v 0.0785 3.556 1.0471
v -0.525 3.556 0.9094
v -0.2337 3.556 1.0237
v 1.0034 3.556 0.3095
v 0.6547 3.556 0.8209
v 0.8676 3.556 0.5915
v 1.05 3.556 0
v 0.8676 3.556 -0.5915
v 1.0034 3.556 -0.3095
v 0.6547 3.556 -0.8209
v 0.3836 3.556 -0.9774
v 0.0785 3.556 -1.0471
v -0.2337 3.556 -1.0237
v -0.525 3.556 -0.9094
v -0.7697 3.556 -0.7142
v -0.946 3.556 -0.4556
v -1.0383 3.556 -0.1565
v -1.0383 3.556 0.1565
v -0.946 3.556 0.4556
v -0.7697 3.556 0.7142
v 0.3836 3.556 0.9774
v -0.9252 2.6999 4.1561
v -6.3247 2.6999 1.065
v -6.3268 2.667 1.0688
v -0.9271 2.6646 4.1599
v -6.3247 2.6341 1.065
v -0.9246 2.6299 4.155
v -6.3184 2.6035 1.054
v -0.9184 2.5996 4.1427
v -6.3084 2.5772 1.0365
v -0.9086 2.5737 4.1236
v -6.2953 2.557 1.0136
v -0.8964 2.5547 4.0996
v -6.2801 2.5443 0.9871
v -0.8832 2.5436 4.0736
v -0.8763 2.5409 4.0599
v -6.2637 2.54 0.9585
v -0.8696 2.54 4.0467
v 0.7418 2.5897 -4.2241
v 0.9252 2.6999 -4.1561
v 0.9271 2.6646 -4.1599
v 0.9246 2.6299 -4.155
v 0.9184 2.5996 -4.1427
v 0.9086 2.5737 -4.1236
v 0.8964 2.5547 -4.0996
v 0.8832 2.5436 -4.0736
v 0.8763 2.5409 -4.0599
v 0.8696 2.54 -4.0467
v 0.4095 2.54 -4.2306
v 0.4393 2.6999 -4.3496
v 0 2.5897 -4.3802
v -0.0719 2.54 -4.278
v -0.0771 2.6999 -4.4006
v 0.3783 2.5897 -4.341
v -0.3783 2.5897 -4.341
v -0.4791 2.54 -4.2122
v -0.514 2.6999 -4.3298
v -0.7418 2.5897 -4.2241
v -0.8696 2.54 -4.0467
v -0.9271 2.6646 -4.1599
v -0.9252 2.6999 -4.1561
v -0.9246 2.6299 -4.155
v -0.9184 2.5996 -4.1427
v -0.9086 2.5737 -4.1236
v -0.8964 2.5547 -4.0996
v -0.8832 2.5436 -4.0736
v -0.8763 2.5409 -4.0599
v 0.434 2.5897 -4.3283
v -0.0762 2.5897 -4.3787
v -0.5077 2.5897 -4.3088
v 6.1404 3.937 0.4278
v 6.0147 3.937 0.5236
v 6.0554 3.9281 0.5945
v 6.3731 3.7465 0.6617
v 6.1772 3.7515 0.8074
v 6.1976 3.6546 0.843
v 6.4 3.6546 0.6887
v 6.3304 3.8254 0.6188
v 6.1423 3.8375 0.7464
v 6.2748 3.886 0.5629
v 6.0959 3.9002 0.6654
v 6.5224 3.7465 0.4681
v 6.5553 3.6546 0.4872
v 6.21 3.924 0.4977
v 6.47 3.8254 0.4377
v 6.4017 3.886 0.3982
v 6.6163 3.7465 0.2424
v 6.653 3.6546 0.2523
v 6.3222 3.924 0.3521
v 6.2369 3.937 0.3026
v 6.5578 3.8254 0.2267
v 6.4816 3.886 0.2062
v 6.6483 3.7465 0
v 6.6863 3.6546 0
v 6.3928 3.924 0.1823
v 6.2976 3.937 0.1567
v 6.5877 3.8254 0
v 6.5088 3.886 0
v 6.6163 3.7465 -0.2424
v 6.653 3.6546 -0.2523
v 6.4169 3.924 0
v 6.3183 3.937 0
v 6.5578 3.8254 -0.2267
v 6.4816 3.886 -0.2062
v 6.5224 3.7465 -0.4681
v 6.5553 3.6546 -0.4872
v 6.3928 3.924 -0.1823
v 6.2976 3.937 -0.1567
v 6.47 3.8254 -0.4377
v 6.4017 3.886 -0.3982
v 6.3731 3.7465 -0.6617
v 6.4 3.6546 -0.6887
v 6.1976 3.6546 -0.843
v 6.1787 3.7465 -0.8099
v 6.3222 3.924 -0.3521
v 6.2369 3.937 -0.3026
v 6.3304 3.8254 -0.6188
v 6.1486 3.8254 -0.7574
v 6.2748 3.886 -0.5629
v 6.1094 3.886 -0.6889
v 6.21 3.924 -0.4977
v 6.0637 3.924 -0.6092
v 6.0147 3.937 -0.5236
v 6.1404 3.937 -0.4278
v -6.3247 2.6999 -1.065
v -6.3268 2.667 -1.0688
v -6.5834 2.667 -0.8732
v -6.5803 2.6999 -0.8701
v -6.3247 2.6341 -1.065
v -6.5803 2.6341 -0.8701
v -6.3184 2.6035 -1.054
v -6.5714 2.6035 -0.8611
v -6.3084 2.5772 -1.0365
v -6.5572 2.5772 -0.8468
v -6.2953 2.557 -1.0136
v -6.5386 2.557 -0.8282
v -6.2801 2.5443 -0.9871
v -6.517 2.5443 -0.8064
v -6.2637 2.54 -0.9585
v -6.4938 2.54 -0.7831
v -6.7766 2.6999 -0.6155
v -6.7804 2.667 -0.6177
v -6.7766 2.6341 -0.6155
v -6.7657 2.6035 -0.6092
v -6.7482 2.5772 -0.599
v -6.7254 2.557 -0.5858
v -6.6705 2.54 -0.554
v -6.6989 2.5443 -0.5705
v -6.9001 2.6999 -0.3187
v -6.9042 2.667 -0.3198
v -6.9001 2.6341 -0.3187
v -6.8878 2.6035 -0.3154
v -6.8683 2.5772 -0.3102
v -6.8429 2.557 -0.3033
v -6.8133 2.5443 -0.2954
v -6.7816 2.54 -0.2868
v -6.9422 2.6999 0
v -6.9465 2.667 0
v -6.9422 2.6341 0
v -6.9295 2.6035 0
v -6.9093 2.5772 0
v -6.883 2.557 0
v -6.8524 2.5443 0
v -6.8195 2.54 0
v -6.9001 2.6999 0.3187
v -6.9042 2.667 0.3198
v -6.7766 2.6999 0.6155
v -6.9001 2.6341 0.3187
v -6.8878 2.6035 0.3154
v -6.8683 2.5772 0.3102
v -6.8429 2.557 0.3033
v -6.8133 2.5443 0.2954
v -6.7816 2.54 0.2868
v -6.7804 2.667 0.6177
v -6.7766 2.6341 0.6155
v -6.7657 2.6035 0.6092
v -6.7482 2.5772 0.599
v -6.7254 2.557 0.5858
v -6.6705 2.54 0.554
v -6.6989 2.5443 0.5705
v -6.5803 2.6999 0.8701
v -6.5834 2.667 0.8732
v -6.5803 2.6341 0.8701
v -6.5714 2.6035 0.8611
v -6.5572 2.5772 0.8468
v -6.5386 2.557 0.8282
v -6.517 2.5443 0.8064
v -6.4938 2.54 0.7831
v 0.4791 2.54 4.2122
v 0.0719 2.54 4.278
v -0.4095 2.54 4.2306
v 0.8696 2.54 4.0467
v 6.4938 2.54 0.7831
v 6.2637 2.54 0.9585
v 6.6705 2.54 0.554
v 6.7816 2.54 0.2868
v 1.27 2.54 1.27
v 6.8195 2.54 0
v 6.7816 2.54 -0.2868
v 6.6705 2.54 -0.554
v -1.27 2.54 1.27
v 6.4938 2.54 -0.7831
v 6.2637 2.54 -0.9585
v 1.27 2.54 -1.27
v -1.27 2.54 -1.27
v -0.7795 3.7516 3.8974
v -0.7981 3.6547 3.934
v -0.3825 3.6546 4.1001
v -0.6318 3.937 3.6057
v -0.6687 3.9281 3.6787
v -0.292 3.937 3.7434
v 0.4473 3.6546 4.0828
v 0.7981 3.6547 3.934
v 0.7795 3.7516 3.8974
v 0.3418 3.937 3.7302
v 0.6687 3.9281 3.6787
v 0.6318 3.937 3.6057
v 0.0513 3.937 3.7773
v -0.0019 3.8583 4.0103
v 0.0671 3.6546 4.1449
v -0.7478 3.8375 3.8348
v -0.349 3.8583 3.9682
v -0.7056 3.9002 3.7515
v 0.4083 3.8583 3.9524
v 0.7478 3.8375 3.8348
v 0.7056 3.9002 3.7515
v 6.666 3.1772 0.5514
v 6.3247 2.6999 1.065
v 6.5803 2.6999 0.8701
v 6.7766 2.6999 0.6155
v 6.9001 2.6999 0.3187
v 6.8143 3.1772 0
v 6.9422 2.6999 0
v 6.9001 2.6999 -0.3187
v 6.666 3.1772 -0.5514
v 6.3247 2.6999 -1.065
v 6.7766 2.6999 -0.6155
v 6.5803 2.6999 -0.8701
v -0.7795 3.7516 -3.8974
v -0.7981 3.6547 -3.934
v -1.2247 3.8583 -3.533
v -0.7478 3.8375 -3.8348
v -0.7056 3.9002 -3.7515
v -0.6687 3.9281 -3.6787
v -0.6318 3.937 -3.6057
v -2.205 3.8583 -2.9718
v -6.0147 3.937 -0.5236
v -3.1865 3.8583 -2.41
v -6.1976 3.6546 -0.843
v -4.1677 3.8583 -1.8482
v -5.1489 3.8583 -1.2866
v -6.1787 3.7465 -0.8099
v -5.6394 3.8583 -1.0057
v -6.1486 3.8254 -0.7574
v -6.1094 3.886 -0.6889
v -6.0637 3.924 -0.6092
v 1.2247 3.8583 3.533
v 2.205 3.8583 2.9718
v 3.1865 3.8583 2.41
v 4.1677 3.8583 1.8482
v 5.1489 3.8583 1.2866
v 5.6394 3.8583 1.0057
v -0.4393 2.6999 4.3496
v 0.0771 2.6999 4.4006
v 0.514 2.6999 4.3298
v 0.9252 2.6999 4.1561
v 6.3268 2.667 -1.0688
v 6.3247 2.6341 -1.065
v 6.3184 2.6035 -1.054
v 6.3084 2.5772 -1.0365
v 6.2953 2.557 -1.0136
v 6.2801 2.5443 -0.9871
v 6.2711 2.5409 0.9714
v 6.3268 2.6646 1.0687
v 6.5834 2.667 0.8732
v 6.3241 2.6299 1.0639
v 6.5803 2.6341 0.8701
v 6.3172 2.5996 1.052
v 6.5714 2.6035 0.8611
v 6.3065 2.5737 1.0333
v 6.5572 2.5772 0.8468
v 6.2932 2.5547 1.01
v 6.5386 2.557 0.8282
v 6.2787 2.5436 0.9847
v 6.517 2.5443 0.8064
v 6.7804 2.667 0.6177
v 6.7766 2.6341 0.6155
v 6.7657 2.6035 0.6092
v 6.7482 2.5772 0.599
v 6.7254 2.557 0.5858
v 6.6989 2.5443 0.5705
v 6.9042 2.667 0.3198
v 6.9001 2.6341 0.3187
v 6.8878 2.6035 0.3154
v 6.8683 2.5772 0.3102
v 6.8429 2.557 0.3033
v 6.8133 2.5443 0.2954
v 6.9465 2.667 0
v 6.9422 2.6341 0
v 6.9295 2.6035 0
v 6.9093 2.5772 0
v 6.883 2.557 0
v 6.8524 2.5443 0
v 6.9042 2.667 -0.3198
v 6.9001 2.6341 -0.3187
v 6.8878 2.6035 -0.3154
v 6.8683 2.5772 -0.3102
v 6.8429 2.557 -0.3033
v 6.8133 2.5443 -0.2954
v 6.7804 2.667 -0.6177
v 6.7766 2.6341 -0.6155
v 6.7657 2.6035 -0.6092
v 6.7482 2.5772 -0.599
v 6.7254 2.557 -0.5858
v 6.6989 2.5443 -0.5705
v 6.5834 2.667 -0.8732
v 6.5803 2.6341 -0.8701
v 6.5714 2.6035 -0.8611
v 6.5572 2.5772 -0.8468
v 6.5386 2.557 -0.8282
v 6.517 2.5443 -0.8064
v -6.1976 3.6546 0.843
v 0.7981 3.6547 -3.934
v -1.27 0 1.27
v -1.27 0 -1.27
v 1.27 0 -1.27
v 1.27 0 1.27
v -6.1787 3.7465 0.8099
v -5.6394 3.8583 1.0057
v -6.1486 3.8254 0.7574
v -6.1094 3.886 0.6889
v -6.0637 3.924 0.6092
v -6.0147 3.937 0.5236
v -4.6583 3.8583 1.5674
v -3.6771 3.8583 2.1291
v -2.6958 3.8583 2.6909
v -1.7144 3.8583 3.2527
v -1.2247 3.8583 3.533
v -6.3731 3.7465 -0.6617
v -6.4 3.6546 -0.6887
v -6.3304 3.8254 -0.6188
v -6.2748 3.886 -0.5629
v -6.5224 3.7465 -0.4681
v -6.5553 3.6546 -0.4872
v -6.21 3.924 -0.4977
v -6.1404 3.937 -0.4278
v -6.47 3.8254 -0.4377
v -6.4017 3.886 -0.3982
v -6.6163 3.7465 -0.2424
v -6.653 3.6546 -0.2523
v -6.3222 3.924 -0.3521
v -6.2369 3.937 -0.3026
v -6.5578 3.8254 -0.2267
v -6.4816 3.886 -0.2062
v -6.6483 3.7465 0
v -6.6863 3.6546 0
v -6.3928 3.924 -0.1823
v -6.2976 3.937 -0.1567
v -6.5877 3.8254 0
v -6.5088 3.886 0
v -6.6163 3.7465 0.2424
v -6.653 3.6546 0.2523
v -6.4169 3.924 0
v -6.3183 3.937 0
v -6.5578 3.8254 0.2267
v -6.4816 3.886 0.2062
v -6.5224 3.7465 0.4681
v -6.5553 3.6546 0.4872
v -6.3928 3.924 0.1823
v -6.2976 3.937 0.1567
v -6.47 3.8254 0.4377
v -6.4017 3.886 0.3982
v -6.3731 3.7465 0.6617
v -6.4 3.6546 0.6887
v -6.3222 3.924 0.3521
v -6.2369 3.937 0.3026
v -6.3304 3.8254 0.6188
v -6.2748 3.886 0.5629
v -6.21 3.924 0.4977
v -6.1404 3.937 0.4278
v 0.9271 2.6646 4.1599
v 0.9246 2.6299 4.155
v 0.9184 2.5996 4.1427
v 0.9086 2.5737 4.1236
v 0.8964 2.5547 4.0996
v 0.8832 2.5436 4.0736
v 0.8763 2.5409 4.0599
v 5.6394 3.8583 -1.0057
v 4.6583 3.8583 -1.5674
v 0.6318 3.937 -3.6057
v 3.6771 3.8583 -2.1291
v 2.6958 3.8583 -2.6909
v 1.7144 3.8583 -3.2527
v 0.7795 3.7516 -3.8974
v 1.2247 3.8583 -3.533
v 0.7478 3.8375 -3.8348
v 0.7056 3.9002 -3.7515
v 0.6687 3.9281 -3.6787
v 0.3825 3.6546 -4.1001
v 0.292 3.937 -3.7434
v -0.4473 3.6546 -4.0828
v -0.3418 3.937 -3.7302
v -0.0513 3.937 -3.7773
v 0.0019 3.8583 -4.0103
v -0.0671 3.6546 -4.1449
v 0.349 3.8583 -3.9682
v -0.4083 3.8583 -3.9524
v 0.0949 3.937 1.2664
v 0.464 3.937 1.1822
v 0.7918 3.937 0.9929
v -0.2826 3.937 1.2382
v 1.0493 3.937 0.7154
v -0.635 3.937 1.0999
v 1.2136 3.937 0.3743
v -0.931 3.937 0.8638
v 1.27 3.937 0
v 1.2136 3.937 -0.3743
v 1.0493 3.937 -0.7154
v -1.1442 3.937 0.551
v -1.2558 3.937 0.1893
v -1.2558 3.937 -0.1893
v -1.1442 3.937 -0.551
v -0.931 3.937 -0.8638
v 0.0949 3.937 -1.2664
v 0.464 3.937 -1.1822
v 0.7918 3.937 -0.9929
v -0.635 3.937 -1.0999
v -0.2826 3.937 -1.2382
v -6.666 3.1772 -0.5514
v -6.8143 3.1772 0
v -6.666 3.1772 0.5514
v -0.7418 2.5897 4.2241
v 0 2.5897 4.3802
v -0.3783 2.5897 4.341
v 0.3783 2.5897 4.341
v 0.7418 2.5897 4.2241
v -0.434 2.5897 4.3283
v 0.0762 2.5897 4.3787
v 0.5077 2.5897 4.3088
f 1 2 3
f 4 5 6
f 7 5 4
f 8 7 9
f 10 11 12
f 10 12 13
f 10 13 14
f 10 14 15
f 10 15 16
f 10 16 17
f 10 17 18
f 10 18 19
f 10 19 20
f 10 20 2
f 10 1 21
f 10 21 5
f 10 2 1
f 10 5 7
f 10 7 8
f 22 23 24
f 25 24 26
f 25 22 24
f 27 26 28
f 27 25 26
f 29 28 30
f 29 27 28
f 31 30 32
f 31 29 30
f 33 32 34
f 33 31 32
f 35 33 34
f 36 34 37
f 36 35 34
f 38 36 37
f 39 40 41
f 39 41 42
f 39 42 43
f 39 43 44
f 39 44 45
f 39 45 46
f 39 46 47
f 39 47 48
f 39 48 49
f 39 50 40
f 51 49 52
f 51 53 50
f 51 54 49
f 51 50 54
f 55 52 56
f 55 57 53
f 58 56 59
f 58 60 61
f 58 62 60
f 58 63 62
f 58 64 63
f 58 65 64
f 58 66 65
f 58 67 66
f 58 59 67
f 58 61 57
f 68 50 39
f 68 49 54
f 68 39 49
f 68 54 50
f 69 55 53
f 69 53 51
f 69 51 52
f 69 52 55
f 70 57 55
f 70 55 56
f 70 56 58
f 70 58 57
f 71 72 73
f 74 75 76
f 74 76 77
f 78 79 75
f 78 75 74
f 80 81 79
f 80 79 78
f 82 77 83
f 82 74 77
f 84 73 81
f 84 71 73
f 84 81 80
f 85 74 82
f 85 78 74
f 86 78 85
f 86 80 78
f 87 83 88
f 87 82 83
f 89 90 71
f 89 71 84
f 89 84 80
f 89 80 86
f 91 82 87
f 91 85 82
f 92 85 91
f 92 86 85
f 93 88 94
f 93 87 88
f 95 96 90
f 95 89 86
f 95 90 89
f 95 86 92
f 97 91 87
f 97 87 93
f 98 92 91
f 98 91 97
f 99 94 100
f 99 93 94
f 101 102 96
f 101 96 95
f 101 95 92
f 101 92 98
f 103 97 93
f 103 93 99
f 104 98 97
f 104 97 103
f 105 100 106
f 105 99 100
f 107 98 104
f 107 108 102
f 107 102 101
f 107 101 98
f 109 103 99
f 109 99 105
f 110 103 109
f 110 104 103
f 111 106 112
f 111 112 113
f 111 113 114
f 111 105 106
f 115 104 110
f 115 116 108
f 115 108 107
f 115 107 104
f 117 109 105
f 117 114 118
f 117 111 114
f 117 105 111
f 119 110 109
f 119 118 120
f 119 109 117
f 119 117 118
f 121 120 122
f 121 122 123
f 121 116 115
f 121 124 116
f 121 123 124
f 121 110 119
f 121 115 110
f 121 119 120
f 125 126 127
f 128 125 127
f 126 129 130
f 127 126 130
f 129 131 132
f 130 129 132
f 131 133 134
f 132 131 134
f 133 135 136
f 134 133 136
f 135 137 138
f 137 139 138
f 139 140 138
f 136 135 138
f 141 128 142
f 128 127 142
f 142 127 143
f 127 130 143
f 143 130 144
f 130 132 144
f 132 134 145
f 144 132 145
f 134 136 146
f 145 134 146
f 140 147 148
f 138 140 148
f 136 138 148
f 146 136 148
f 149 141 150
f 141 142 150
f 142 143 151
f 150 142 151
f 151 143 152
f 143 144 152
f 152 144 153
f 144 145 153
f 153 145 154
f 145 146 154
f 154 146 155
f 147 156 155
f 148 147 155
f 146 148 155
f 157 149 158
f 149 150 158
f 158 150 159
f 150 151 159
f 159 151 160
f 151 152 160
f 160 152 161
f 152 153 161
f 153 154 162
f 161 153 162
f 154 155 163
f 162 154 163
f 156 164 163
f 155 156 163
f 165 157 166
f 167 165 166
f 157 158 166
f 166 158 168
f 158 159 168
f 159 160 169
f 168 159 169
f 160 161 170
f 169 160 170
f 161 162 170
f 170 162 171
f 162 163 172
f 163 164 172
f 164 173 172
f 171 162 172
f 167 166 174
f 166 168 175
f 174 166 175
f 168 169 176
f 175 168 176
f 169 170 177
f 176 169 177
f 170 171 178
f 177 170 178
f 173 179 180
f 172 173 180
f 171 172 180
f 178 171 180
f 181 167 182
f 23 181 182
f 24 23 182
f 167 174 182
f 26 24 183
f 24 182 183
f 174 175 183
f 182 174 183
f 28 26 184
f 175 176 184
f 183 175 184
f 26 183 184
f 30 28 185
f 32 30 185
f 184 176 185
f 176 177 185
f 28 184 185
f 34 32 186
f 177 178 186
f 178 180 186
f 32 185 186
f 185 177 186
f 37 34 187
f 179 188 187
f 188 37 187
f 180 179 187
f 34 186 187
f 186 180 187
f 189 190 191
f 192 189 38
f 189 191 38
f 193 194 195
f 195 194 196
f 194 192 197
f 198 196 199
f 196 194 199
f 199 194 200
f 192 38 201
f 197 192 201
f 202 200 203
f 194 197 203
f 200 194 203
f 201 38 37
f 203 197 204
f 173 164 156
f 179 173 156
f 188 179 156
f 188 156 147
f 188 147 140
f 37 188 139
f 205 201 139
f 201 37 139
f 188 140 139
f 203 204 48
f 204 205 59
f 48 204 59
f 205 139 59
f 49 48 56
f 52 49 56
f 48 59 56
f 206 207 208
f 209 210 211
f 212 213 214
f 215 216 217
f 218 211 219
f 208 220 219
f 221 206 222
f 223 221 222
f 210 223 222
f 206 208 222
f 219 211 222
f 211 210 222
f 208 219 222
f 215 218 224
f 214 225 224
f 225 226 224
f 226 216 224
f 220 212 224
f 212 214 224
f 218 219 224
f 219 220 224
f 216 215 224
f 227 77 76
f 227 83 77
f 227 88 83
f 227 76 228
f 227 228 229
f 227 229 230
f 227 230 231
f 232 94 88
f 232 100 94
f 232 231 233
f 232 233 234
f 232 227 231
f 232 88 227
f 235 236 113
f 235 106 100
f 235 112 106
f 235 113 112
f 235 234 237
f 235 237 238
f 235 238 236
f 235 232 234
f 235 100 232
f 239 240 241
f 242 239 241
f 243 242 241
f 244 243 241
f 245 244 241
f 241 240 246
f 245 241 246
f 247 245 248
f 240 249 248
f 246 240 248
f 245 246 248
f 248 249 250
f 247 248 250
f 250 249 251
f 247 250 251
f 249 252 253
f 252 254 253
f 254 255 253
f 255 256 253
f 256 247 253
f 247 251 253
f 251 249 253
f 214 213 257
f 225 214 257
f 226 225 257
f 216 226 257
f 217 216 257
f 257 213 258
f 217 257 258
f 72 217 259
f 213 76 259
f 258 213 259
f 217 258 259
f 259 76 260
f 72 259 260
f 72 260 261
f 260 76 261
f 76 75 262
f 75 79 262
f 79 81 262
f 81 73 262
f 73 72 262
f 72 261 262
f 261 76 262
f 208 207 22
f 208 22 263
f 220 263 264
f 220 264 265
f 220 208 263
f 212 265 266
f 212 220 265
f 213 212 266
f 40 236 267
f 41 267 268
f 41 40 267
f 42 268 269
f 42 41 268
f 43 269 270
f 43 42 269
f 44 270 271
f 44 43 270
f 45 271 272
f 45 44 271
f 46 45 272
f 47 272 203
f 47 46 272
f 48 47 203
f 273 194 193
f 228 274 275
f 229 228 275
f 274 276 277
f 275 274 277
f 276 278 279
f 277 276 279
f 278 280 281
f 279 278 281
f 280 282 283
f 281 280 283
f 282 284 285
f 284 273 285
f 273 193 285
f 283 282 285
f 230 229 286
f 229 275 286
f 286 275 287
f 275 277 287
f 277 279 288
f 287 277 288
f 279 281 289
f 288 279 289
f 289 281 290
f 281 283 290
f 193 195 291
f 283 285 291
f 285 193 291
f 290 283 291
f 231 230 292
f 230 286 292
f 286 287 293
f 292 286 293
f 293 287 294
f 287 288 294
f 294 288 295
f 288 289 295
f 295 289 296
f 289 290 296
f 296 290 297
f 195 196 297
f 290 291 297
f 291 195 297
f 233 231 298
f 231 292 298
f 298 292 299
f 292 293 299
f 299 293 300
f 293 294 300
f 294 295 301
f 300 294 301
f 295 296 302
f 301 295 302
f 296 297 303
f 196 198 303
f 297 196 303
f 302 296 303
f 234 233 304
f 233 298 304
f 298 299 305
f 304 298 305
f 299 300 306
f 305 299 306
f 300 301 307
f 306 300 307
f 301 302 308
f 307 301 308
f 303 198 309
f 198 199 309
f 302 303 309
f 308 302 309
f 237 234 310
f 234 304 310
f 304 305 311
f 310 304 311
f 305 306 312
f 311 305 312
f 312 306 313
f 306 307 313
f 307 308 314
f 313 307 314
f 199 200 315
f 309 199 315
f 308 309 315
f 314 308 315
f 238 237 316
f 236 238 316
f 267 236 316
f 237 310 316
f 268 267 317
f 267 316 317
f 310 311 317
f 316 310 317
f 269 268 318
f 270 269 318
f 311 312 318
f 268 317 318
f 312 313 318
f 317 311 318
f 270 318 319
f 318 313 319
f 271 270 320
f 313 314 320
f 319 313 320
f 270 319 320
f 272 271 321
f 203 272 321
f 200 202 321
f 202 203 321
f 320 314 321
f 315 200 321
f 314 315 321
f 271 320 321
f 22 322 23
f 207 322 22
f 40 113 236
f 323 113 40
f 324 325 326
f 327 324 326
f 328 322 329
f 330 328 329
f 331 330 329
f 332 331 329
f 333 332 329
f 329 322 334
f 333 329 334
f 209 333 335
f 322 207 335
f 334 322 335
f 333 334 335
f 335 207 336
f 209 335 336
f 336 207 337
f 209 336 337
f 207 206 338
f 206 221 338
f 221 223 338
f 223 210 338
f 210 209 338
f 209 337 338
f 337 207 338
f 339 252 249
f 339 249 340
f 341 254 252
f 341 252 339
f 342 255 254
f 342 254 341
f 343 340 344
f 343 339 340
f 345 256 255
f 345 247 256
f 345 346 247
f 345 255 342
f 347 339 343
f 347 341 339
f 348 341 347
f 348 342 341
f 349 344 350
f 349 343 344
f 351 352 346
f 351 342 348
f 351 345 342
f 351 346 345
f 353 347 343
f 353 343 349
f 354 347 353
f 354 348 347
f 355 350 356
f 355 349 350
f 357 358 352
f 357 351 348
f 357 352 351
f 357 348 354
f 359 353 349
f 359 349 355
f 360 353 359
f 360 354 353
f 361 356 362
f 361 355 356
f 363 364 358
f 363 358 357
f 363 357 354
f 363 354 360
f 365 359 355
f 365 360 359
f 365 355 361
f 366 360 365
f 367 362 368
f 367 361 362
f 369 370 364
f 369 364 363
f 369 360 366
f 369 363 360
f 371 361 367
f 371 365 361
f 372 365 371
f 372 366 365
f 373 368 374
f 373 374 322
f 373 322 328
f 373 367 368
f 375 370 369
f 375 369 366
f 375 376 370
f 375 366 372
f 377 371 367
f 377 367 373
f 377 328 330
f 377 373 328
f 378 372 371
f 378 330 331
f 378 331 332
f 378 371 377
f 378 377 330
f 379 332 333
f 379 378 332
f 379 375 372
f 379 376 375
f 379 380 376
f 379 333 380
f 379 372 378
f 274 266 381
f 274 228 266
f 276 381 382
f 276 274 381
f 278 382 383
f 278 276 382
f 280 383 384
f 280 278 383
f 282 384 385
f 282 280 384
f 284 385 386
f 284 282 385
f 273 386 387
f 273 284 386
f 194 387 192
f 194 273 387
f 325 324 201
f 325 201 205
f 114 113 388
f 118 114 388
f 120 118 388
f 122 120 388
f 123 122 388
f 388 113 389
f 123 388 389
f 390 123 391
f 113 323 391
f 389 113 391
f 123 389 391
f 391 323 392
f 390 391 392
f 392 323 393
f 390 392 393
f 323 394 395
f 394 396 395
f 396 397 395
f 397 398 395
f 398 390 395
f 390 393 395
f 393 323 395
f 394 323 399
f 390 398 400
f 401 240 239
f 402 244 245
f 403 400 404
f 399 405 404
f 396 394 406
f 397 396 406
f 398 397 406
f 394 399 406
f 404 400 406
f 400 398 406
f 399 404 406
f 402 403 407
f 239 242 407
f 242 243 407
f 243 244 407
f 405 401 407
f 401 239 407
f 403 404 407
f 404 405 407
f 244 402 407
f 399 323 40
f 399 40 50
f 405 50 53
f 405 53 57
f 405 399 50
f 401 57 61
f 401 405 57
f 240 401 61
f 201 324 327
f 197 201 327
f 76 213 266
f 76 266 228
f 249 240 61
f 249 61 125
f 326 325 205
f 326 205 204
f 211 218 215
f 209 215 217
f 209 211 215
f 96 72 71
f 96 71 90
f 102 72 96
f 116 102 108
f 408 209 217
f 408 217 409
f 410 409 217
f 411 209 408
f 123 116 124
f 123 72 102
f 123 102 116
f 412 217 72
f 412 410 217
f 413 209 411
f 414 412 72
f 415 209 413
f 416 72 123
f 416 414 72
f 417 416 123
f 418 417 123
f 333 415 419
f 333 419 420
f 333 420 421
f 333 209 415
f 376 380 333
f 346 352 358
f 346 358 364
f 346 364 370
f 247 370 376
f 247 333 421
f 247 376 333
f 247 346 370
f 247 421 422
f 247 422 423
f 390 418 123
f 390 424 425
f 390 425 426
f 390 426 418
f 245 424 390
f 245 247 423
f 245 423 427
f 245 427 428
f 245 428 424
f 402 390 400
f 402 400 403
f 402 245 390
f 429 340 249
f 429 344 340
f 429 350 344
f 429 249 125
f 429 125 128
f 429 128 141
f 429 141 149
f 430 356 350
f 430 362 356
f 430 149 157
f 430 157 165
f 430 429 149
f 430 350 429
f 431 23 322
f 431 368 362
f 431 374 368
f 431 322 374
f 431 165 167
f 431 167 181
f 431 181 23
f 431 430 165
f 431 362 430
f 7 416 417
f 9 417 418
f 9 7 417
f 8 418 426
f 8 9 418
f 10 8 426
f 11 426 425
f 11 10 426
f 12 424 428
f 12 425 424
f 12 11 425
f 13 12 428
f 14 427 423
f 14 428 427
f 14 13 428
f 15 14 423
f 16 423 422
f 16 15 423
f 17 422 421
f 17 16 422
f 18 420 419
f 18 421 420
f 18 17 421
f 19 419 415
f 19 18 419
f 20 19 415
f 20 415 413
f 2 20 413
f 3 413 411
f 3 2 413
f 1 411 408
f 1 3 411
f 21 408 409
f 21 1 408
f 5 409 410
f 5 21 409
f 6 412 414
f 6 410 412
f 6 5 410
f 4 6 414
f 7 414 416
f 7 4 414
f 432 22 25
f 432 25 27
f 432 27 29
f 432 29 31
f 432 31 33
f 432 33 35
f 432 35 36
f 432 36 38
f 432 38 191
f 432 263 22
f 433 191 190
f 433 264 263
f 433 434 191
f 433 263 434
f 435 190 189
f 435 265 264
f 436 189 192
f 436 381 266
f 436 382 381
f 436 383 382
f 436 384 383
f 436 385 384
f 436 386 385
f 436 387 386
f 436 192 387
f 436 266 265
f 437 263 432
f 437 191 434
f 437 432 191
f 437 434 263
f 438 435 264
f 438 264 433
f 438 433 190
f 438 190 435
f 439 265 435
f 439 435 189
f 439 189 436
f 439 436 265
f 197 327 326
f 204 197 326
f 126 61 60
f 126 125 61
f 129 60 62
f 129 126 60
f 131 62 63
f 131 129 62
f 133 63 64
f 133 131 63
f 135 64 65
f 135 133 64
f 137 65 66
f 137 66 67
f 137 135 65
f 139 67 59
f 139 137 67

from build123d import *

# Parameters (mm, degrees)
SKETCH1_W           = 2.54
SKETCH1_H           = 2.54
BOSS_EXTRUDE1_DEPTH = 2.54
BOSS_EXTRUDE2_DEPTH = 1.397
BOSS_EXTRUDE2_TAPER = 15
FILLET1_R           = 0.381
FILLET2_R           = 0.127
SKETCH3_R           = 1.27
CUT_EXTRUDE1_DEPTH  = 0.381
CUT_EXTRUDE1_TAPER  = 30


with BuildPart() as part:
    # Sketch1 → Boss-Extrude1 (new body)
    with BuildSketch(Plane(origin=(0, 0, 0), x_dir=(1, 0, 0), z_dir=(0, 1, 0))):
        Rectangle(SKETCH1_W, SKETCH1_H)
    extrude(amount=BOSS_EXTRUDE1_DEPTH)

    # Sketch2 → Boss-Extrude2 (add)
    with BuildSketch(Plane(origin=(0, 2.54, 0), x_dir=(1, 0, 0), z_dir=(0, 1, 0))):
        with BuildLine():
            Line((6.345965274, 1.102171866), (0.946447911, 4.1932578))
            ThreePointArc((0.946447911, 4.1932578), (0, 4.445), (-0.946447911, 4.1932578))
            Line((-0.946447911, 4.1932578), (-6.345965274, 1.102171866))
            ThreePointArc((-6.345965274, 1.102171866), (-6.985, 0), (-6.345965274, -1.102171866))
            Line((-6.345965274, -1.102171866), (-0.946447911, -4.1932578))
            ThreePointArc((-0.946447911, -4.1932578), (0, -4.445), (0.946447911, -4.1932578))
            Line((0.946447911, -4.1932578), (6.345965274, -1.102171866))
            ThreePointArc((6.345965274, -1.102171866), (6.985, 0), (6.345965274, 1.102171866))
        make_face()
    extrude(amount=BOSS_EXTRUDE2_DEPTH, taper=BOSS_EXTRUDE2_TAPER)

    # Fillet1
    fillet1_edges = [part.edges().sort_by_distance(p)[0] for p in [
        (0, 3.937, -4.070674978),
        (-3.460233293, 3.937, -2.322856165),
        (-6.610674978, 3.937, 0),
        (-3.460233293, 3.937, 2.322856165),
        (0, 3.937, 4.070674978),
        (3.460233293, 3.937, 2.322856165),
        (6.610674978, 3.937, 0),
        (3.460233293, 3.937, -2.322856165),
    ]]
    fillet(fillet1_edges, radius=FILLET1_R)

    # Fillet2
    fillet2_edges = [part.edges().sort_by_distance(p)[0] for p in [
        (0, 2.54, -4.445),
        (-3.646206592, 2.54, -2.647714833),
        (-6.985, 2.54, 0),
        (-3.646206592, 2.54, 2.647714833),
        (0, 2.54, 4.445),
        (3.646206592, 2.54, 2.647714833),
        (6.985, 2.54, 0),
        (3.646206592, 2.54, -2.647714833),
    ]]
    fillet(fillet2_edges, radius=FILLET2_R)

    # Sketch3 → Cut-Extrude1 (cut)
    with BuildSketch(Plane(origin=(0, 3.937, 0), x_dir=(1, 0, 0), z_dir=(0, 1, 0))):
        Circle(SKETCH3_R)
    extrude(amount=-CUT_EXTRUDE1_DEPTH, taper=CUT_EXTRUDE1_TAPER, mode=Mode.SUBTRACT)


solid = part.part
